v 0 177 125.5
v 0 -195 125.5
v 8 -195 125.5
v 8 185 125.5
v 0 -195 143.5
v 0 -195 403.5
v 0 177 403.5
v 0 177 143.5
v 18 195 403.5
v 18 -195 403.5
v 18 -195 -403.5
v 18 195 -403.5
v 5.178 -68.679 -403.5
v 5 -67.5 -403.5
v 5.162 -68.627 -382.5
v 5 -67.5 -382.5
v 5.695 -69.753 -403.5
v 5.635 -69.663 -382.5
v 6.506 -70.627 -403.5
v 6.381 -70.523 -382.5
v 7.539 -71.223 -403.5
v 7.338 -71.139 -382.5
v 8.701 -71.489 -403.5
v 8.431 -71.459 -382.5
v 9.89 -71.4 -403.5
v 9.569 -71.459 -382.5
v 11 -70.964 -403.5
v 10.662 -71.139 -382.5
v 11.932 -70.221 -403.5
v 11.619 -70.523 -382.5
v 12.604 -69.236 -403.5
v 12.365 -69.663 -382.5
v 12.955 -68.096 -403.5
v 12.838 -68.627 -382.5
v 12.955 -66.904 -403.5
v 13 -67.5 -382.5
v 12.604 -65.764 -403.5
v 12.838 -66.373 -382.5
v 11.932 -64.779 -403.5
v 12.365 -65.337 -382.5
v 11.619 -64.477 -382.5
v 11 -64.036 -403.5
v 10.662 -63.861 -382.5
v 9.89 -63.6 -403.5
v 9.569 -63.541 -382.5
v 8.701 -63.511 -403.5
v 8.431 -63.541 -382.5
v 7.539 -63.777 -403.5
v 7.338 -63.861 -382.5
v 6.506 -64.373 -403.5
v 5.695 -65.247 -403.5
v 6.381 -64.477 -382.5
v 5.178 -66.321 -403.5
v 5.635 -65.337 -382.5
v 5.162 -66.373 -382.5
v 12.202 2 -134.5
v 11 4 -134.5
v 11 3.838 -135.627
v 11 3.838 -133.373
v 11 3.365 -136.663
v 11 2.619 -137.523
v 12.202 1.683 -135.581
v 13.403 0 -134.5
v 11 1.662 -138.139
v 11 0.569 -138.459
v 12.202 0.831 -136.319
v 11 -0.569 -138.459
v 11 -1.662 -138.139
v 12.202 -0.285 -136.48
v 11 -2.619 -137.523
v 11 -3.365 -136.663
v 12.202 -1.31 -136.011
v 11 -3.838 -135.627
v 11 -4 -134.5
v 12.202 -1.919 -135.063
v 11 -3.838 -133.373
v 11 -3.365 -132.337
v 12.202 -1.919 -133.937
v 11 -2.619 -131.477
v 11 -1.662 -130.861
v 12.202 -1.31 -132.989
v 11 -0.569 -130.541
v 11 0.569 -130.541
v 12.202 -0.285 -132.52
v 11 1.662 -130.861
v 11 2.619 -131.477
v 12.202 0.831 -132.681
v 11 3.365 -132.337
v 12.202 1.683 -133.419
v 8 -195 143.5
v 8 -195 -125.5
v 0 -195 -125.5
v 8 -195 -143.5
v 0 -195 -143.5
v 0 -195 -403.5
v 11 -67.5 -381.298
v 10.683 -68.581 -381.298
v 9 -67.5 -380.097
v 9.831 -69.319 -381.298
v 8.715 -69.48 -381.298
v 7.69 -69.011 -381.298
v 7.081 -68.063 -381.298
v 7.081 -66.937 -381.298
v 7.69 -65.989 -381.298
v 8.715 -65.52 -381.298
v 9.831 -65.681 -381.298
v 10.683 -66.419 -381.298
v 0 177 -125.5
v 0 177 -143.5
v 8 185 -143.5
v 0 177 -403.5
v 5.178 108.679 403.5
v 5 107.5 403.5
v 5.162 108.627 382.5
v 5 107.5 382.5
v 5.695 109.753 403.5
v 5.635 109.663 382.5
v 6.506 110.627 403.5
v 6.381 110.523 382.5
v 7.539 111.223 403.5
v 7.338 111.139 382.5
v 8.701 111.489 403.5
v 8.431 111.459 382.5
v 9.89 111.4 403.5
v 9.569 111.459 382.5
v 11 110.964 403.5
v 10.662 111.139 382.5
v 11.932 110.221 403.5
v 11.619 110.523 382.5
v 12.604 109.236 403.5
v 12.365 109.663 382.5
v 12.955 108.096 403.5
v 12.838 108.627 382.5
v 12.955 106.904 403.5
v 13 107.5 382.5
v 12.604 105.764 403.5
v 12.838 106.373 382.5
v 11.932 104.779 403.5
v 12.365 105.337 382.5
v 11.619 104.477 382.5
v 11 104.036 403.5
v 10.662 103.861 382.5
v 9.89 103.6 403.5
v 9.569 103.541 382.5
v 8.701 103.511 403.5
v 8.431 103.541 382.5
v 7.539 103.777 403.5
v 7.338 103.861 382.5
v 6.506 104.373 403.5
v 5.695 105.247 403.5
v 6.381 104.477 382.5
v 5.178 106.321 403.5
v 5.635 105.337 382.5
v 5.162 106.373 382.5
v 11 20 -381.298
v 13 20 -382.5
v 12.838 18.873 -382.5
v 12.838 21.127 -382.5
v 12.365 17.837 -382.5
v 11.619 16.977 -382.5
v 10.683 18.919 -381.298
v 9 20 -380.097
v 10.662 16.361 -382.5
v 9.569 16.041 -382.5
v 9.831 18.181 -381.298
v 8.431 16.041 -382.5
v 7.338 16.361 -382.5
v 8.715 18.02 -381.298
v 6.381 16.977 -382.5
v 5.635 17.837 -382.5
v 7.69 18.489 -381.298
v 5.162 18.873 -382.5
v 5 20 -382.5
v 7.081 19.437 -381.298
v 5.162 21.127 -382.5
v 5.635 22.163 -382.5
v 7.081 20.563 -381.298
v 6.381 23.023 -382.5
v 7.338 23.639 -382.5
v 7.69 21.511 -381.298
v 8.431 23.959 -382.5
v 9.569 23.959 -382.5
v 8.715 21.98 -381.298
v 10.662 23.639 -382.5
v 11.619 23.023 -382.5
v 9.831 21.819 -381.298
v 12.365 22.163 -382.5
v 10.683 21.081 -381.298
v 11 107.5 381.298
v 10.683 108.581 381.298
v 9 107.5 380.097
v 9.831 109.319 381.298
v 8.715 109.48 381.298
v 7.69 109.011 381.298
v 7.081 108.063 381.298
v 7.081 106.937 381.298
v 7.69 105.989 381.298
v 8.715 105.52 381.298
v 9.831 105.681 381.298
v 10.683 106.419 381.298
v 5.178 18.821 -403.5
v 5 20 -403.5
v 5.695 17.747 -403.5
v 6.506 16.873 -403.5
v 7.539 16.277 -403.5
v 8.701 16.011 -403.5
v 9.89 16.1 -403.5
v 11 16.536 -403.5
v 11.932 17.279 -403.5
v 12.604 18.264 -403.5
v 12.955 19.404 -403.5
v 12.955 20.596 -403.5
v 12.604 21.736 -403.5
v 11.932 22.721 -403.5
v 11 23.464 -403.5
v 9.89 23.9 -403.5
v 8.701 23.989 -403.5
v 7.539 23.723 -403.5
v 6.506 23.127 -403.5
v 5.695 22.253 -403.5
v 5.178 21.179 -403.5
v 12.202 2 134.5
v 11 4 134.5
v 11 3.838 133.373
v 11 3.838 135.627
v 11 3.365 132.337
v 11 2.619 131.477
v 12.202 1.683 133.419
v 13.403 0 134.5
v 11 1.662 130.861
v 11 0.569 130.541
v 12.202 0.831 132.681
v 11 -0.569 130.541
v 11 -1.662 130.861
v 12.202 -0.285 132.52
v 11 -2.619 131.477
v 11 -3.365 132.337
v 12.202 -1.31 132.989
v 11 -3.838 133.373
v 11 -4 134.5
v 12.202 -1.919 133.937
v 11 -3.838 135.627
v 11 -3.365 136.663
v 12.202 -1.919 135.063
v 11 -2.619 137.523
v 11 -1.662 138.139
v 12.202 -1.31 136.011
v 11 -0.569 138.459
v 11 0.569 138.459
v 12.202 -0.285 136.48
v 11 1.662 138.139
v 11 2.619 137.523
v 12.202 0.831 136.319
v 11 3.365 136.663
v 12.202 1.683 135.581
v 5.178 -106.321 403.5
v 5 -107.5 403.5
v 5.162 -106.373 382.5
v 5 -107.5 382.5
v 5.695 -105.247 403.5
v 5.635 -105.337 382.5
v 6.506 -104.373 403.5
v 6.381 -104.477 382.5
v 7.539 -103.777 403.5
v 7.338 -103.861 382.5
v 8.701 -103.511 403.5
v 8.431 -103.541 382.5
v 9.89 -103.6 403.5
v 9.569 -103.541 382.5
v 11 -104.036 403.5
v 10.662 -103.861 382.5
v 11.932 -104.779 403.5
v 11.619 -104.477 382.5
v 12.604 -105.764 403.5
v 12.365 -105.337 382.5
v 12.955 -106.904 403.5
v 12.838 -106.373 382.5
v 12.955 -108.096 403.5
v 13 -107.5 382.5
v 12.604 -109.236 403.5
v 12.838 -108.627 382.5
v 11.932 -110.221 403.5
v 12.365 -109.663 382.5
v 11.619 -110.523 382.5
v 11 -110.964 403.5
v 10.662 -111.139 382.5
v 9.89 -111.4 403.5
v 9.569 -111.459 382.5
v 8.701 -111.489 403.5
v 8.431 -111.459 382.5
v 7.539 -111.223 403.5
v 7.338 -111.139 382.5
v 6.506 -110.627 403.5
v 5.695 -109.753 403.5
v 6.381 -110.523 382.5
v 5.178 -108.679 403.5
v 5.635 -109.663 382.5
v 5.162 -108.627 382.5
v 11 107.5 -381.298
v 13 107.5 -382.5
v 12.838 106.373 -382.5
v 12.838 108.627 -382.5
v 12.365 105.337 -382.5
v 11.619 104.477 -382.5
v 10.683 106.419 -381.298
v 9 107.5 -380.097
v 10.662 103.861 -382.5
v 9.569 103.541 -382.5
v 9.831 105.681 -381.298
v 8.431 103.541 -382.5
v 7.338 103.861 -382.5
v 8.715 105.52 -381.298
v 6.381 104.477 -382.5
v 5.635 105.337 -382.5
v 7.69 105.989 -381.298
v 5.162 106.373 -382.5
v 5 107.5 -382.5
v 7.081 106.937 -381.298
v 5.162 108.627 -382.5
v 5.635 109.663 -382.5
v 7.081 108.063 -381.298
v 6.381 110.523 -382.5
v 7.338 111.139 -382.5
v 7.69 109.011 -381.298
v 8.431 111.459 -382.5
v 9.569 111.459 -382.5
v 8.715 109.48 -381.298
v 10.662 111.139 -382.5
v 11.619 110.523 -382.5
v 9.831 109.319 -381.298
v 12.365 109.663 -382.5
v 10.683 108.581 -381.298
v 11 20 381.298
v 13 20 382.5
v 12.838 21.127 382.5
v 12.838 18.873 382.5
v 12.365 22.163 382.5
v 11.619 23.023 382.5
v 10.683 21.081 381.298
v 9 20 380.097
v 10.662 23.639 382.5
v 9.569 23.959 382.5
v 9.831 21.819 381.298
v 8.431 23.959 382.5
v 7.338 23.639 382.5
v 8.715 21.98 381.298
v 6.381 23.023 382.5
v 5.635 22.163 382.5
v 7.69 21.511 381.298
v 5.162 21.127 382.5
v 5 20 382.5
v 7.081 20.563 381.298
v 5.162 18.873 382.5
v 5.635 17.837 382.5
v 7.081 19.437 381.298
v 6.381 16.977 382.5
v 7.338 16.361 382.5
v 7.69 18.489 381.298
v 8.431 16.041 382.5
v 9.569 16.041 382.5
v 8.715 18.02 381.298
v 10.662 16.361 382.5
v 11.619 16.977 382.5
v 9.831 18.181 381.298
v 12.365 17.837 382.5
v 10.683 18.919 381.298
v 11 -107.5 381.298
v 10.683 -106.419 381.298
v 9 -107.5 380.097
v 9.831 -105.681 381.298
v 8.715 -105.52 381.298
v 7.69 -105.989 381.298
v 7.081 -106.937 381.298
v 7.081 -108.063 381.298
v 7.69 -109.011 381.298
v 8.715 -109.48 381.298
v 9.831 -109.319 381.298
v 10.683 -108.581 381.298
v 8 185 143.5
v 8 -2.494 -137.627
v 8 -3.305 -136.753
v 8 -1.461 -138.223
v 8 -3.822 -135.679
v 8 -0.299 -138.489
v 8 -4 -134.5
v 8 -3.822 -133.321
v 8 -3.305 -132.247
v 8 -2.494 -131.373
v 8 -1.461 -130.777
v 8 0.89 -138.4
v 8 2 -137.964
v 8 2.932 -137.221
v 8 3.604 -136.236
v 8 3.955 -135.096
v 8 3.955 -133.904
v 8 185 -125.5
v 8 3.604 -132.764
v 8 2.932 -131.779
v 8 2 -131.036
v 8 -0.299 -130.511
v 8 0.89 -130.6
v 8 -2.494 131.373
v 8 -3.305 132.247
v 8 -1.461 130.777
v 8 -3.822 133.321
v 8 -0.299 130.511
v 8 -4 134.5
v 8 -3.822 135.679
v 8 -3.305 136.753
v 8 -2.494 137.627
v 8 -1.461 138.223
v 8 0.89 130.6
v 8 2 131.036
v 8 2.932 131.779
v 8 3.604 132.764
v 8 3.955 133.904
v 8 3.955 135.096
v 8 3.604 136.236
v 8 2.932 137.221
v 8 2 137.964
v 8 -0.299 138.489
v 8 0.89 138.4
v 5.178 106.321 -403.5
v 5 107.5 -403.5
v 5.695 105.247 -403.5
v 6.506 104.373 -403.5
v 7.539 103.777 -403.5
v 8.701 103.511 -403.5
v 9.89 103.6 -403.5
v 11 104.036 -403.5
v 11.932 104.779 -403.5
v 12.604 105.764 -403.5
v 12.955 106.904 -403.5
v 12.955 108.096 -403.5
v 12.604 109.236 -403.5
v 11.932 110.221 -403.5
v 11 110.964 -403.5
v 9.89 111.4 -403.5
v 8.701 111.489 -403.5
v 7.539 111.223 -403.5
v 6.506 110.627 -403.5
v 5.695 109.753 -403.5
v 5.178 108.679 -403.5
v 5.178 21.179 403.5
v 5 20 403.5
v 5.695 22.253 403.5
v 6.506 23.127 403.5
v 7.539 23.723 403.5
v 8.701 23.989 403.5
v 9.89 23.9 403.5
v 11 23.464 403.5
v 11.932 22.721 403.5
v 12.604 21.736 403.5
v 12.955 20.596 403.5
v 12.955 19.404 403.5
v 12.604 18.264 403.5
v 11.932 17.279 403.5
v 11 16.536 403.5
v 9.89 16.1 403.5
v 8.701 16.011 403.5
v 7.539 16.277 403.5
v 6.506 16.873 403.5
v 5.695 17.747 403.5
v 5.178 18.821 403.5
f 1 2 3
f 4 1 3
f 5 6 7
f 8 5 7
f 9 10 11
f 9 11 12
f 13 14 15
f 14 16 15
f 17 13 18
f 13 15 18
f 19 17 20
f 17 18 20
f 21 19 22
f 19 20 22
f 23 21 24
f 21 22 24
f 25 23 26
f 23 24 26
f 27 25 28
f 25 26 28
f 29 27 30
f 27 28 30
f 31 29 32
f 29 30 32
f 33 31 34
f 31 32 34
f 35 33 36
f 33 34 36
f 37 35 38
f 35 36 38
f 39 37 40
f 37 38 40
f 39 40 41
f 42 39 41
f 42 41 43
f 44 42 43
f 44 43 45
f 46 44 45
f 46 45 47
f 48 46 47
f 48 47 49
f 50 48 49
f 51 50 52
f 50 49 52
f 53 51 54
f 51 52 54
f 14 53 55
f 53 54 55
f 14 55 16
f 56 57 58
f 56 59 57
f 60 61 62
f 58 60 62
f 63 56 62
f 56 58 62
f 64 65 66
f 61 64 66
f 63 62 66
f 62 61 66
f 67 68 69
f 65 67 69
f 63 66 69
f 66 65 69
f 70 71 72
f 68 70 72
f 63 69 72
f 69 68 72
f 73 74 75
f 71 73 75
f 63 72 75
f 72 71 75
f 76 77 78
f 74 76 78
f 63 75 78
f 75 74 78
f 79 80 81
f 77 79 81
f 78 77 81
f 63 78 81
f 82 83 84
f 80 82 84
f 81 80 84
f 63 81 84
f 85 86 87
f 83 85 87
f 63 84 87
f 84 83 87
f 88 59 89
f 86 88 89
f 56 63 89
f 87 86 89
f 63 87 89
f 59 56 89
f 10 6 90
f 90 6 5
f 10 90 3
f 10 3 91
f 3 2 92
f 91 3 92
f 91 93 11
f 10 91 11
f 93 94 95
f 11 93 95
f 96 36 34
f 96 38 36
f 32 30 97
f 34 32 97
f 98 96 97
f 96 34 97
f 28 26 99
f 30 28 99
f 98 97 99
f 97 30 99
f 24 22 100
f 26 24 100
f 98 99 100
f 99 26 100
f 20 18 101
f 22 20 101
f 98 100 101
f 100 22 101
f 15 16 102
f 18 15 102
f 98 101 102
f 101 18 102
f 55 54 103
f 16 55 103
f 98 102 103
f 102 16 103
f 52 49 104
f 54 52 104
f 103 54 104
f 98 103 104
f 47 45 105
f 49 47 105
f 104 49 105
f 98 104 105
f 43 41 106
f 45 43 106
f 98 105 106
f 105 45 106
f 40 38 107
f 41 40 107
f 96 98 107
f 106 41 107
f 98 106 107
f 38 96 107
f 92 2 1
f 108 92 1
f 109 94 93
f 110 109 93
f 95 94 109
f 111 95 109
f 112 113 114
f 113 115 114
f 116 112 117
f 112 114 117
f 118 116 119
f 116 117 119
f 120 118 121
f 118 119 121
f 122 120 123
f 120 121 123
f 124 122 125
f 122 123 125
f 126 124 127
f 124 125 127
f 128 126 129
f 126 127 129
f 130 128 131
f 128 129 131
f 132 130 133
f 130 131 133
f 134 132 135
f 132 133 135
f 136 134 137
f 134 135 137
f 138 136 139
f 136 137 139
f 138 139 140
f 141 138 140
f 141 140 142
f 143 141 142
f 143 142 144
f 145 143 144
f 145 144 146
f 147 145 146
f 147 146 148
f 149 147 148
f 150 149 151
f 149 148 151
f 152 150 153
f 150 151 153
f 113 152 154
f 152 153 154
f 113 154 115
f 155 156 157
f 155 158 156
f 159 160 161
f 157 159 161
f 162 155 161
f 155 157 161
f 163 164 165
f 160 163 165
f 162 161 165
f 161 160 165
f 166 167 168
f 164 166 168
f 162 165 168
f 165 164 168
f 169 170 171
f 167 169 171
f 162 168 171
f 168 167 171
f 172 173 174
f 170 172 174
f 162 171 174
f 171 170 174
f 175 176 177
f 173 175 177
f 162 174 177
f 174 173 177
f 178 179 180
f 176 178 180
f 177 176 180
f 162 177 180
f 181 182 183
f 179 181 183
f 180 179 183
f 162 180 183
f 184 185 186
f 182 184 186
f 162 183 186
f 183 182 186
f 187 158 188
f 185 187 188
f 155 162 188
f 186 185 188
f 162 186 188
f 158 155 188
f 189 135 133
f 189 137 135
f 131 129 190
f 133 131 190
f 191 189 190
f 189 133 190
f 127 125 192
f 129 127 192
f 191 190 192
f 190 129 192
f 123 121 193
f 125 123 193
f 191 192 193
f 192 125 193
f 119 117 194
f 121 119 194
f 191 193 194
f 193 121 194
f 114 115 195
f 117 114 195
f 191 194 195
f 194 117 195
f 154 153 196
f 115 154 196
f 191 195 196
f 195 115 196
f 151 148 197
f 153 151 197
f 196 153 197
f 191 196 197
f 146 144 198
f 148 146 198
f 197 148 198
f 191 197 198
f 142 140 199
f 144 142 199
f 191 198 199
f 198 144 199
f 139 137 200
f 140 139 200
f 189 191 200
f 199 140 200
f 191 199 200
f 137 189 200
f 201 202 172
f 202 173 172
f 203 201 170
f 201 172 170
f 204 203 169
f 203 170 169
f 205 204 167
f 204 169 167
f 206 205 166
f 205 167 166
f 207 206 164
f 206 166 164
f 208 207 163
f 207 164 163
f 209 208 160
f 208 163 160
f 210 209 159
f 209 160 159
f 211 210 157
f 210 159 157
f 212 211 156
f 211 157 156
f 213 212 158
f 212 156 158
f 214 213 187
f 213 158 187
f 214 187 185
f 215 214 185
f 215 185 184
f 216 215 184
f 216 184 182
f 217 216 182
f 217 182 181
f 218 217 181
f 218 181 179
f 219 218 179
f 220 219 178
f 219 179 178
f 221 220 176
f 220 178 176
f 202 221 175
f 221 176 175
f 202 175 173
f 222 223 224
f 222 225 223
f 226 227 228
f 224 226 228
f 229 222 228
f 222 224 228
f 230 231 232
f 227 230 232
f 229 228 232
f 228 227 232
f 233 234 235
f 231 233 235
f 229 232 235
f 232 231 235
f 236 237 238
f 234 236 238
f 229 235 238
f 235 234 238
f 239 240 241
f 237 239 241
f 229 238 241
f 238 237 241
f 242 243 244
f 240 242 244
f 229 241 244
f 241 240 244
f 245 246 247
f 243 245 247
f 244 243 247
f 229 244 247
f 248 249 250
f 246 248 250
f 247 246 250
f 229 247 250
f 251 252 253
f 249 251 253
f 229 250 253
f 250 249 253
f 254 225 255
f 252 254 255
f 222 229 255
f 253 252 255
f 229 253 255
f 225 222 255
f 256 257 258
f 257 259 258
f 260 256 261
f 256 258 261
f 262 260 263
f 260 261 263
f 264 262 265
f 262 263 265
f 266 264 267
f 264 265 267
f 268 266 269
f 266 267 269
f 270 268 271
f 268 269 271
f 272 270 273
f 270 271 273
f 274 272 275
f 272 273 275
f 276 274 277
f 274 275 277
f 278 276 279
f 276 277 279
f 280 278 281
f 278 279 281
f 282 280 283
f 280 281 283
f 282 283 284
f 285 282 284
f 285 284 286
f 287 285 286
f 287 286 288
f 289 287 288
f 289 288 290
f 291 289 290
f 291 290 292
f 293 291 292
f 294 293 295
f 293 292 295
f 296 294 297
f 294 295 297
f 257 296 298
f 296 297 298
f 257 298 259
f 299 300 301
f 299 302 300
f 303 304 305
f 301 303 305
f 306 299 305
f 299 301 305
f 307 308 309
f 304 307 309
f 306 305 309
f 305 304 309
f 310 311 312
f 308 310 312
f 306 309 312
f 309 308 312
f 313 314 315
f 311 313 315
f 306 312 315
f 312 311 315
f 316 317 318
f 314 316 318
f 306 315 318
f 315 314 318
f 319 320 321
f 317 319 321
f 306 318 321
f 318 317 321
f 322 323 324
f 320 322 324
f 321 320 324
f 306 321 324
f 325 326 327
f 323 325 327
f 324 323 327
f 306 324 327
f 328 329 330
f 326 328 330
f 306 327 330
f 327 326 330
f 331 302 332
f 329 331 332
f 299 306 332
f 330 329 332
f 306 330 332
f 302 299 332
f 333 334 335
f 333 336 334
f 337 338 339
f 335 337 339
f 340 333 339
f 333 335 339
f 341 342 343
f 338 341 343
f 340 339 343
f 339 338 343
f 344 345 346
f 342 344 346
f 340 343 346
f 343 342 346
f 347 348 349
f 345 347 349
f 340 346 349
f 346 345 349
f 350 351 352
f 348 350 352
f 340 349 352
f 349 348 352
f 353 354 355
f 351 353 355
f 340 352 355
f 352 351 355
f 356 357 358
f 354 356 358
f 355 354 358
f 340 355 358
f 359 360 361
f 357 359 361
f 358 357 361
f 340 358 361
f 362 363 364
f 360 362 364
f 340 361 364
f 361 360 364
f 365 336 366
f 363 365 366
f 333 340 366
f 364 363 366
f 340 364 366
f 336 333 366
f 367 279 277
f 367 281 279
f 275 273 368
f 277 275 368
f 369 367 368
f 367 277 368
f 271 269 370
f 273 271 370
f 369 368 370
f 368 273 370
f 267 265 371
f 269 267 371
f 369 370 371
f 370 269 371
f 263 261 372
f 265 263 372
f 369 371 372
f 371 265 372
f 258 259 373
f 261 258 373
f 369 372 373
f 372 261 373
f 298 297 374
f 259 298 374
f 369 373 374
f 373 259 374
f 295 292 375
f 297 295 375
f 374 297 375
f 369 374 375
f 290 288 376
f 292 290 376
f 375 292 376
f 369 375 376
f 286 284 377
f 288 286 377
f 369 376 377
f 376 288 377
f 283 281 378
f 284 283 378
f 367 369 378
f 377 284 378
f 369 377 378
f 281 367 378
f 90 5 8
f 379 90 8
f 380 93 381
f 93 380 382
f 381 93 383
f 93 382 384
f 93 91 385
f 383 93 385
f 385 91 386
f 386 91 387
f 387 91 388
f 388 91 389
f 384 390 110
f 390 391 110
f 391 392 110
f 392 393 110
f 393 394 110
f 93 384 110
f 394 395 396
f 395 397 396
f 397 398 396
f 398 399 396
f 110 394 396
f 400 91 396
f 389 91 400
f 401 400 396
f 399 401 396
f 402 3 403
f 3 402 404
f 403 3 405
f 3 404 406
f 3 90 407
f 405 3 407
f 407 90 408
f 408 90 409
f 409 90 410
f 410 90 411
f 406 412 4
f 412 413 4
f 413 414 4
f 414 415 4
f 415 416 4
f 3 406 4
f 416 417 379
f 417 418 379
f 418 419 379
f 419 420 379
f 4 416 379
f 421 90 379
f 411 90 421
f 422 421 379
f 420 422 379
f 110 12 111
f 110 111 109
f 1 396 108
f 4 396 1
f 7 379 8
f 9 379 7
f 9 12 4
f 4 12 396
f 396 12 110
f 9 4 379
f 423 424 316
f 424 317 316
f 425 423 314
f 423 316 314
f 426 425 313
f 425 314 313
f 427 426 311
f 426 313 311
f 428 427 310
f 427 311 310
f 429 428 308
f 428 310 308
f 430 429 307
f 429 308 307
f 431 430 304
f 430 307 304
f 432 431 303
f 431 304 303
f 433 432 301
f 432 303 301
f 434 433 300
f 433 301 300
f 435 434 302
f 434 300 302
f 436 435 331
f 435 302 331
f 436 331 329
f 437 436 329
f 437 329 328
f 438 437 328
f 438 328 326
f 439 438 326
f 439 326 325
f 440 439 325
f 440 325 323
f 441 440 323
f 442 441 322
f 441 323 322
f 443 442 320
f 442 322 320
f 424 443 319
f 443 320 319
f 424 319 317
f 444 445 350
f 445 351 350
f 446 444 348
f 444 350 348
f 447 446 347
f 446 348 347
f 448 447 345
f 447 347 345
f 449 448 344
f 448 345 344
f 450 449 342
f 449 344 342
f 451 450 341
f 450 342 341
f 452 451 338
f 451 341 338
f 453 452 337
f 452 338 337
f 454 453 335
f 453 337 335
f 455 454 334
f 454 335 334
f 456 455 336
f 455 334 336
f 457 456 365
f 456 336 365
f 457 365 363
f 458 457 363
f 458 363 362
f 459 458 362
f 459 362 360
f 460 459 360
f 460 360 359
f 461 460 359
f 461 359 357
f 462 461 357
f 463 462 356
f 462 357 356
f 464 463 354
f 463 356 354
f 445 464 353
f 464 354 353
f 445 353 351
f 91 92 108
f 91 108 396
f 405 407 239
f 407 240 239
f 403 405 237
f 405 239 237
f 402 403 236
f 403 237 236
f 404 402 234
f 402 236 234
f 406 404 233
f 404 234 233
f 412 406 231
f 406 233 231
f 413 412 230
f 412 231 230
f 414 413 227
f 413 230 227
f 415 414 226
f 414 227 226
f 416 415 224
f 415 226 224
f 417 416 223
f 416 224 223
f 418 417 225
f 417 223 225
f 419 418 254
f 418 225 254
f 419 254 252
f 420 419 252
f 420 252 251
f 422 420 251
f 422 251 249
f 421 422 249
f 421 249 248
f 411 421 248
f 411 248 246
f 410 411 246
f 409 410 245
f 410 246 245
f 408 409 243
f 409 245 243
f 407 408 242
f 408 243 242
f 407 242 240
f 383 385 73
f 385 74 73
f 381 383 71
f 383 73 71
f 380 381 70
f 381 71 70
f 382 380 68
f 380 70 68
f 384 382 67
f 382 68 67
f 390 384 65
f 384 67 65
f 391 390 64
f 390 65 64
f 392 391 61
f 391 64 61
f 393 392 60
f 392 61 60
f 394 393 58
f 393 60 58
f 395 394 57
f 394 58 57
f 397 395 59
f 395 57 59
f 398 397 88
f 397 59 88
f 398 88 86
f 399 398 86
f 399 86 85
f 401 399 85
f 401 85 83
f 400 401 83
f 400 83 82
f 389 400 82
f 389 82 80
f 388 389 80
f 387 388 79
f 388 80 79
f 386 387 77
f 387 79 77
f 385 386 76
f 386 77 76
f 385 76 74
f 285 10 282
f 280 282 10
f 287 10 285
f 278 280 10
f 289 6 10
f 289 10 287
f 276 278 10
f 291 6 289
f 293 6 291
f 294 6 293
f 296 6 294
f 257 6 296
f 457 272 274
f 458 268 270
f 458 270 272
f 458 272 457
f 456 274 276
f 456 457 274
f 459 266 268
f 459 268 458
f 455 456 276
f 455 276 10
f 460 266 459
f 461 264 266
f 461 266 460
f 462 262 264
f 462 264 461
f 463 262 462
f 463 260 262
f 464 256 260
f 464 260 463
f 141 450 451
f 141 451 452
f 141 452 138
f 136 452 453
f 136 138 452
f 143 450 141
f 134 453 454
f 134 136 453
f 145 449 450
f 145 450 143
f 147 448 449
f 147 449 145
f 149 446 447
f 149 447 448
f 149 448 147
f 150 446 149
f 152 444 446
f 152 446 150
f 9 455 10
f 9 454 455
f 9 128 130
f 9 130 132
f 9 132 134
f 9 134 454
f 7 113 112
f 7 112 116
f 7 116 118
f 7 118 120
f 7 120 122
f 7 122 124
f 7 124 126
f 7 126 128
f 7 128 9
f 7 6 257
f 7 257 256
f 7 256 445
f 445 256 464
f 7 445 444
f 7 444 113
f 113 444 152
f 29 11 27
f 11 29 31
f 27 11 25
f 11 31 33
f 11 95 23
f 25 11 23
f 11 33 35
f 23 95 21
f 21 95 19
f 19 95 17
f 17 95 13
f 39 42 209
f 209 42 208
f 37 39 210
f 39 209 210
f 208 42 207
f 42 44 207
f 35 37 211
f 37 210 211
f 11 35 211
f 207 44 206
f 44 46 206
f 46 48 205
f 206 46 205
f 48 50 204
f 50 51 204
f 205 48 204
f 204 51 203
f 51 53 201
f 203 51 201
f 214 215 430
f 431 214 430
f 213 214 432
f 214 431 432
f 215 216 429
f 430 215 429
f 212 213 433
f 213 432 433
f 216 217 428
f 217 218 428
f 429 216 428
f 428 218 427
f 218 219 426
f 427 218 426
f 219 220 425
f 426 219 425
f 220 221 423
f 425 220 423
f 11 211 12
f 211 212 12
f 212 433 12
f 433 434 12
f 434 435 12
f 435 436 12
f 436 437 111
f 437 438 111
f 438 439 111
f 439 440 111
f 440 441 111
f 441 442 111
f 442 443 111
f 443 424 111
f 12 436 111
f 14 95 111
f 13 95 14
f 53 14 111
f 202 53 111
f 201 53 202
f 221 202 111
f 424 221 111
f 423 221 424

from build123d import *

# Parameters (mm, degrees)
F0_W           = 390
F0_H           = 260
F0_H_2         = 251
F0_H_3         = 18
F1_DEPTH       = 18
F2_DEPTH       = 8
F3_SIZE2       = 17.99999
F3_SIZE        = 17.99999
F6_D           = 8
F6_DEPTH       = 21
F6_TIP         = 2.4034424761
F6_ON_F5_D     = 8
F6_ON_F5_DEPTH = 21
F6_ON_F5_TIP   = 2.4034424761
F8_D           = 8
F8_DEPTH       = 11
F8_TIP         = 2.4034424761


# Not quite as in the source:
# - a fillet or chamfer is up to 0.001 mm smaller than in the source, because OpenCascade refuses the exact size


with BuildPart() as f1:
    # F0 (on Right) → F1 (new body)
    with BuildSketch(Plane.YZ):
        with Locations((0, 273.5)):
            Rectangle(F0_W, F0_H)
        Rectangle(F0_W, F0_H_2)
        with Locations((0, -273.5)):
            Rectangle(F0_W, F0_H)
        with Locations((0, 134.5)):
            Rectangle(F0_W, F0_H_3)
        with Locations((0, -134.5)):
            Rectangle(F0_W, F0_H_3)
    extrude(amount=F1_DEPTH)

    # F0 (on Right) → F2 (cut)
    with BuildSketch(Plane.YZ):
        with Locations((0, 134.5)):
            Rectangle(F0_W, F0_H_3)
        with Locations((0, -134.5)):
            Rectangle(F0_W, F0_H_3)
    extrude(amount=F2_DEPTH, mode=Mode.SUBTRACT)

    # F3 (size 18 and 18 in the source; OpenCascade refuses exactly that, so slightly less here)
    f3_edges = [f1.edges().sort_by_distance(p)[0] for p in [
        (0, 195, 0),
    ]]
    chamfer(f3_edges, length=F3_SIZE, length2=F3_SIZE2)

    # F6
    with Locations(Plane.XY.offset(403.5)):
        with Locations((9, 107.5), (9, 20), (9, -107.5)):
            Hole(F6_D / 2, depth=F6_DEPTH)
            with Locations((0, 0, -(F6_DEPTH + F6_TIP / 2))):  # 118° drill point
                Cone(0, F6_D / 2, F6_TIP, mode=Mode.SUBTRACT)

    # F6 on F5
    with Locations(Plane(origin=(0, 0, -403.5), x_dir=(1, 0, 0), z_dir=(0, 0, -1))):
        with Locations((9, -107.5), (9, -20), (9, 67.5)):
            Hole(F6_ON_F5_D / 2, depth=F6_ON_F5_DEPTH)
            with Locations((0, 0, -(F6_ON_F5_DEPTH + F6_ON_F5_TIP / 2))):  # 118° drill point
                Cone(0, F6_ON_F5_D / 2, F6_ON_F5_TIP, mode=Mode.SUBTRACT)

    # F8
    with Locations(Plane(origin=(0, 0, 0), x_dir=(0, 1, 0), z_dir=(-1, 0, 0))):
        with Locations((0, 134.5), (0, -134.5)):
            Hole(F8_D / 2, depth=F8_DEPTH)
            with Locations((0, 0, -(F8_DEPTH + F8_TIP / 2))):  # 118° drill point
                Cone(0, F8_D / 2, F8_TIP, mode=Mode.SUBTRACT)


solid = f1.part
